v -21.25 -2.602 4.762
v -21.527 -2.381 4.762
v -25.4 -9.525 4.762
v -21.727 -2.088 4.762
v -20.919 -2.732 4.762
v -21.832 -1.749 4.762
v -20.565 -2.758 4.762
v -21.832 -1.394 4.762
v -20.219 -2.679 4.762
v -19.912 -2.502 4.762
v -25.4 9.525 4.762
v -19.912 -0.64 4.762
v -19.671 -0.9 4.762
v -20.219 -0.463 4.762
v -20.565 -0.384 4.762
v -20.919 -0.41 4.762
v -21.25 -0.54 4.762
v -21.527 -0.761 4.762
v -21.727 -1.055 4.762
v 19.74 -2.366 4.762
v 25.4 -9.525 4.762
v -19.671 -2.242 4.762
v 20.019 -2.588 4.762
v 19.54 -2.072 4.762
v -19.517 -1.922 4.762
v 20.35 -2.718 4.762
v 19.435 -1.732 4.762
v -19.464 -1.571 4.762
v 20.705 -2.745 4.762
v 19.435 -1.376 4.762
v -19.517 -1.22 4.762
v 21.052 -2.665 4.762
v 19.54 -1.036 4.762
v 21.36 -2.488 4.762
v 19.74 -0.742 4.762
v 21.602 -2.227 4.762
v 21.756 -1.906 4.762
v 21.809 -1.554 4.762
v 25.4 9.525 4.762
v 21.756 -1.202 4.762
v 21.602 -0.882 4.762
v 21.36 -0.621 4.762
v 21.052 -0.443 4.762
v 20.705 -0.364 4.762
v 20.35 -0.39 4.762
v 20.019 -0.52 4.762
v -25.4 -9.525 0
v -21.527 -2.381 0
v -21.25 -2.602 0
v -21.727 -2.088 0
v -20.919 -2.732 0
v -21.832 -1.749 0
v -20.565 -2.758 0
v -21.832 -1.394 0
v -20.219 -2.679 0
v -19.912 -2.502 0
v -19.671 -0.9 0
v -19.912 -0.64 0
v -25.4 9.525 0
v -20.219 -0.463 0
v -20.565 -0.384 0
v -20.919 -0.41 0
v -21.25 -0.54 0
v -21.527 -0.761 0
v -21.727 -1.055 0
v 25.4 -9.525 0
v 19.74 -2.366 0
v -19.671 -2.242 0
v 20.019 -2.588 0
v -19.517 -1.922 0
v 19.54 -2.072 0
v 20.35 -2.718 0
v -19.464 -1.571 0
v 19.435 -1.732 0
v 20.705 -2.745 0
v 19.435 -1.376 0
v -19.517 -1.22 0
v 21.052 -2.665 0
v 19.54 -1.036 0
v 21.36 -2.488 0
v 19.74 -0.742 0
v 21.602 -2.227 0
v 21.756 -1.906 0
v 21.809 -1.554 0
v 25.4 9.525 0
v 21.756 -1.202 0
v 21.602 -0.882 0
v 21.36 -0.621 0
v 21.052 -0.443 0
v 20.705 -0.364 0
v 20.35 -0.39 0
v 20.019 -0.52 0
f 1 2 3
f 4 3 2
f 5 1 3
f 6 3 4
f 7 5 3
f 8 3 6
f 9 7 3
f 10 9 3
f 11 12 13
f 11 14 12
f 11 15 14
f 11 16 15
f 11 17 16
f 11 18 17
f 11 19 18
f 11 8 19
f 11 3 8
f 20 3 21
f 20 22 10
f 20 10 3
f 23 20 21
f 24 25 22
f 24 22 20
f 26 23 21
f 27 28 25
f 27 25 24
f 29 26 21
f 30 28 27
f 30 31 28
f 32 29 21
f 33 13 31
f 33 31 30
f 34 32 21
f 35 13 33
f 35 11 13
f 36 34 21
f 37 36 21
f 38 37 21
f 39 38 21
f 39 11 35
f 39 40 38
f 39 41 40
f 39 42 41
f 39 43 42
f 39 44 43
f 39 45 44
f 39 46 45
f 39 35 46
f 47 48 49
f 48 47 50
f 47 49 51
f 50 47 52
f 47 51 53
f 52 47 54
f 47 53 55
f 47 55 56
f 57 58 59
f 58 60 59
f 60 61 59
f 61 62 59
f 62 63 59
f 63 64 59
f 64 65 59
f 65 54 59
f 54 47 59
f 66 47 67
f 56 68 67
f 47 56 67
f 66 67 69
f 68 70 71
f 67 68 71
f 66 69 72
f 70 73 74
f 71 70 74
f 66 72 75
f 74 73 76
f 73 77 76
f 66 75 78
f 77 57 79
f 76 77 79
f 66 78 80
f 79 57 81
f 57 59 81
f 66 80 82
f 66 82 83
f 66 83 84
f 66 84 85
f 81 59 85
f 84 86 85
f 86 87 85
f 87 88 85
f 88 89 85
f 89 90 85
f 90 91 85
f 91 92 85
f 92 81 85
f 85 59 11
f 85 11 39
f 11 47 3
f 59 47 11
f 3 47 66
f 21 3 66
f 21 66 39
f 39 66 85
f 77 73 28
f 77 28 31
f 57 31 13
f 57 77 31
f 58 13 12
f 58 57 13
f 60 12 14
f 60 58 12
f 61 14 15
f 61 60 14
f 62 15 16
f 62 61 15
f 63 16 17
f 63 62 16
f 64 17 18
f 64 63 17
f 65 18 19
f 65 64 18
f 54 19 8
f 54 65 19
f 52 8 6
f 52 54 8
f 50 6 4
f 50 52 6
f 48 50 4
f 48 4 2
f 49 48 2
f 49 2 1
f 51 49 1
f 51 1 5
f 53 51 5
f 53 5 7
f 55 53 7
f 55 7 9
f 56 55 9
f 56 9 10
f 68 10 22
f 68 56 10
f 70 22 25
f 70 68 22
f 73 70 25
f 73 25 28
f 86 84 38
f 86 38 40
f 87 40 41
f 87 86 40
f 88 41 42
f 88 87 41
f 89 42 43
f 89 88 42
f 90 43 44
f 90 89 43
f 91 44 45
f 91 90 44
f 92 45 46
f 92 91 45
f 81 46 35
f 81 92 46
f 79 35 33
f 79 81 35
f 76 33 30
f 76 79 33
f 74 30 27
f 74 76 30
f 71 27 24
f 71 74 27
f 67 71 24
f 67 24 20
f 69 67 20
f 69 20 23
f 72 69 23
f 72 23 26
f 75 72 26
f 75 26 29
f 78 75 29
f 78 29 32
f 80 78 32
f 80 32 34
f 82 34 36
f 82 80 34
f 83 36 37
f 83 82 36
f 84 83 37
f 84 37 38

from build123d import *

# Parameters (mm, degrees)
F0_W     = 50.8
F0_H     = 19.05
F3_DEPTH = 4.7625
F2_R     = 1.1938
F4_DEPTH = 4.7625
F1_R     = 1.190625
F5_DEPTH = 4.7625


# Not quite as in the source:
# - a length typed as a fraction of an inch, garbled in the dataset ("3 / 203.2 mm" for 3/8 in), is restored


with BuildPart() as f3:
    # F0 (on Top) → F3 (new body)
    with BuildSketch(Plane.XY):
        Rectangle(F0_W, F0_H)
    extrude(amount=F3_DEPTH)

    # F2 (on face) → F4 (cut)
    with BuildSketch(Plane.XY):
        with Locations((20.6155478954, -1.5542221954)):
            Circle(F2_R)
    extrude(amount=F4_DEPTH, mode=Mode.SUBTRACT)

    # F1 (on face) → F5 (cut)
    with BuildSketch(Plane.XY):
        with Locations((-20.6543747336, -1.571108005)):
            Circle(F1_R)
    extrude(amount=F5_DEPTH, mode=Mode.SUBTRACT)


solid = f3.part
